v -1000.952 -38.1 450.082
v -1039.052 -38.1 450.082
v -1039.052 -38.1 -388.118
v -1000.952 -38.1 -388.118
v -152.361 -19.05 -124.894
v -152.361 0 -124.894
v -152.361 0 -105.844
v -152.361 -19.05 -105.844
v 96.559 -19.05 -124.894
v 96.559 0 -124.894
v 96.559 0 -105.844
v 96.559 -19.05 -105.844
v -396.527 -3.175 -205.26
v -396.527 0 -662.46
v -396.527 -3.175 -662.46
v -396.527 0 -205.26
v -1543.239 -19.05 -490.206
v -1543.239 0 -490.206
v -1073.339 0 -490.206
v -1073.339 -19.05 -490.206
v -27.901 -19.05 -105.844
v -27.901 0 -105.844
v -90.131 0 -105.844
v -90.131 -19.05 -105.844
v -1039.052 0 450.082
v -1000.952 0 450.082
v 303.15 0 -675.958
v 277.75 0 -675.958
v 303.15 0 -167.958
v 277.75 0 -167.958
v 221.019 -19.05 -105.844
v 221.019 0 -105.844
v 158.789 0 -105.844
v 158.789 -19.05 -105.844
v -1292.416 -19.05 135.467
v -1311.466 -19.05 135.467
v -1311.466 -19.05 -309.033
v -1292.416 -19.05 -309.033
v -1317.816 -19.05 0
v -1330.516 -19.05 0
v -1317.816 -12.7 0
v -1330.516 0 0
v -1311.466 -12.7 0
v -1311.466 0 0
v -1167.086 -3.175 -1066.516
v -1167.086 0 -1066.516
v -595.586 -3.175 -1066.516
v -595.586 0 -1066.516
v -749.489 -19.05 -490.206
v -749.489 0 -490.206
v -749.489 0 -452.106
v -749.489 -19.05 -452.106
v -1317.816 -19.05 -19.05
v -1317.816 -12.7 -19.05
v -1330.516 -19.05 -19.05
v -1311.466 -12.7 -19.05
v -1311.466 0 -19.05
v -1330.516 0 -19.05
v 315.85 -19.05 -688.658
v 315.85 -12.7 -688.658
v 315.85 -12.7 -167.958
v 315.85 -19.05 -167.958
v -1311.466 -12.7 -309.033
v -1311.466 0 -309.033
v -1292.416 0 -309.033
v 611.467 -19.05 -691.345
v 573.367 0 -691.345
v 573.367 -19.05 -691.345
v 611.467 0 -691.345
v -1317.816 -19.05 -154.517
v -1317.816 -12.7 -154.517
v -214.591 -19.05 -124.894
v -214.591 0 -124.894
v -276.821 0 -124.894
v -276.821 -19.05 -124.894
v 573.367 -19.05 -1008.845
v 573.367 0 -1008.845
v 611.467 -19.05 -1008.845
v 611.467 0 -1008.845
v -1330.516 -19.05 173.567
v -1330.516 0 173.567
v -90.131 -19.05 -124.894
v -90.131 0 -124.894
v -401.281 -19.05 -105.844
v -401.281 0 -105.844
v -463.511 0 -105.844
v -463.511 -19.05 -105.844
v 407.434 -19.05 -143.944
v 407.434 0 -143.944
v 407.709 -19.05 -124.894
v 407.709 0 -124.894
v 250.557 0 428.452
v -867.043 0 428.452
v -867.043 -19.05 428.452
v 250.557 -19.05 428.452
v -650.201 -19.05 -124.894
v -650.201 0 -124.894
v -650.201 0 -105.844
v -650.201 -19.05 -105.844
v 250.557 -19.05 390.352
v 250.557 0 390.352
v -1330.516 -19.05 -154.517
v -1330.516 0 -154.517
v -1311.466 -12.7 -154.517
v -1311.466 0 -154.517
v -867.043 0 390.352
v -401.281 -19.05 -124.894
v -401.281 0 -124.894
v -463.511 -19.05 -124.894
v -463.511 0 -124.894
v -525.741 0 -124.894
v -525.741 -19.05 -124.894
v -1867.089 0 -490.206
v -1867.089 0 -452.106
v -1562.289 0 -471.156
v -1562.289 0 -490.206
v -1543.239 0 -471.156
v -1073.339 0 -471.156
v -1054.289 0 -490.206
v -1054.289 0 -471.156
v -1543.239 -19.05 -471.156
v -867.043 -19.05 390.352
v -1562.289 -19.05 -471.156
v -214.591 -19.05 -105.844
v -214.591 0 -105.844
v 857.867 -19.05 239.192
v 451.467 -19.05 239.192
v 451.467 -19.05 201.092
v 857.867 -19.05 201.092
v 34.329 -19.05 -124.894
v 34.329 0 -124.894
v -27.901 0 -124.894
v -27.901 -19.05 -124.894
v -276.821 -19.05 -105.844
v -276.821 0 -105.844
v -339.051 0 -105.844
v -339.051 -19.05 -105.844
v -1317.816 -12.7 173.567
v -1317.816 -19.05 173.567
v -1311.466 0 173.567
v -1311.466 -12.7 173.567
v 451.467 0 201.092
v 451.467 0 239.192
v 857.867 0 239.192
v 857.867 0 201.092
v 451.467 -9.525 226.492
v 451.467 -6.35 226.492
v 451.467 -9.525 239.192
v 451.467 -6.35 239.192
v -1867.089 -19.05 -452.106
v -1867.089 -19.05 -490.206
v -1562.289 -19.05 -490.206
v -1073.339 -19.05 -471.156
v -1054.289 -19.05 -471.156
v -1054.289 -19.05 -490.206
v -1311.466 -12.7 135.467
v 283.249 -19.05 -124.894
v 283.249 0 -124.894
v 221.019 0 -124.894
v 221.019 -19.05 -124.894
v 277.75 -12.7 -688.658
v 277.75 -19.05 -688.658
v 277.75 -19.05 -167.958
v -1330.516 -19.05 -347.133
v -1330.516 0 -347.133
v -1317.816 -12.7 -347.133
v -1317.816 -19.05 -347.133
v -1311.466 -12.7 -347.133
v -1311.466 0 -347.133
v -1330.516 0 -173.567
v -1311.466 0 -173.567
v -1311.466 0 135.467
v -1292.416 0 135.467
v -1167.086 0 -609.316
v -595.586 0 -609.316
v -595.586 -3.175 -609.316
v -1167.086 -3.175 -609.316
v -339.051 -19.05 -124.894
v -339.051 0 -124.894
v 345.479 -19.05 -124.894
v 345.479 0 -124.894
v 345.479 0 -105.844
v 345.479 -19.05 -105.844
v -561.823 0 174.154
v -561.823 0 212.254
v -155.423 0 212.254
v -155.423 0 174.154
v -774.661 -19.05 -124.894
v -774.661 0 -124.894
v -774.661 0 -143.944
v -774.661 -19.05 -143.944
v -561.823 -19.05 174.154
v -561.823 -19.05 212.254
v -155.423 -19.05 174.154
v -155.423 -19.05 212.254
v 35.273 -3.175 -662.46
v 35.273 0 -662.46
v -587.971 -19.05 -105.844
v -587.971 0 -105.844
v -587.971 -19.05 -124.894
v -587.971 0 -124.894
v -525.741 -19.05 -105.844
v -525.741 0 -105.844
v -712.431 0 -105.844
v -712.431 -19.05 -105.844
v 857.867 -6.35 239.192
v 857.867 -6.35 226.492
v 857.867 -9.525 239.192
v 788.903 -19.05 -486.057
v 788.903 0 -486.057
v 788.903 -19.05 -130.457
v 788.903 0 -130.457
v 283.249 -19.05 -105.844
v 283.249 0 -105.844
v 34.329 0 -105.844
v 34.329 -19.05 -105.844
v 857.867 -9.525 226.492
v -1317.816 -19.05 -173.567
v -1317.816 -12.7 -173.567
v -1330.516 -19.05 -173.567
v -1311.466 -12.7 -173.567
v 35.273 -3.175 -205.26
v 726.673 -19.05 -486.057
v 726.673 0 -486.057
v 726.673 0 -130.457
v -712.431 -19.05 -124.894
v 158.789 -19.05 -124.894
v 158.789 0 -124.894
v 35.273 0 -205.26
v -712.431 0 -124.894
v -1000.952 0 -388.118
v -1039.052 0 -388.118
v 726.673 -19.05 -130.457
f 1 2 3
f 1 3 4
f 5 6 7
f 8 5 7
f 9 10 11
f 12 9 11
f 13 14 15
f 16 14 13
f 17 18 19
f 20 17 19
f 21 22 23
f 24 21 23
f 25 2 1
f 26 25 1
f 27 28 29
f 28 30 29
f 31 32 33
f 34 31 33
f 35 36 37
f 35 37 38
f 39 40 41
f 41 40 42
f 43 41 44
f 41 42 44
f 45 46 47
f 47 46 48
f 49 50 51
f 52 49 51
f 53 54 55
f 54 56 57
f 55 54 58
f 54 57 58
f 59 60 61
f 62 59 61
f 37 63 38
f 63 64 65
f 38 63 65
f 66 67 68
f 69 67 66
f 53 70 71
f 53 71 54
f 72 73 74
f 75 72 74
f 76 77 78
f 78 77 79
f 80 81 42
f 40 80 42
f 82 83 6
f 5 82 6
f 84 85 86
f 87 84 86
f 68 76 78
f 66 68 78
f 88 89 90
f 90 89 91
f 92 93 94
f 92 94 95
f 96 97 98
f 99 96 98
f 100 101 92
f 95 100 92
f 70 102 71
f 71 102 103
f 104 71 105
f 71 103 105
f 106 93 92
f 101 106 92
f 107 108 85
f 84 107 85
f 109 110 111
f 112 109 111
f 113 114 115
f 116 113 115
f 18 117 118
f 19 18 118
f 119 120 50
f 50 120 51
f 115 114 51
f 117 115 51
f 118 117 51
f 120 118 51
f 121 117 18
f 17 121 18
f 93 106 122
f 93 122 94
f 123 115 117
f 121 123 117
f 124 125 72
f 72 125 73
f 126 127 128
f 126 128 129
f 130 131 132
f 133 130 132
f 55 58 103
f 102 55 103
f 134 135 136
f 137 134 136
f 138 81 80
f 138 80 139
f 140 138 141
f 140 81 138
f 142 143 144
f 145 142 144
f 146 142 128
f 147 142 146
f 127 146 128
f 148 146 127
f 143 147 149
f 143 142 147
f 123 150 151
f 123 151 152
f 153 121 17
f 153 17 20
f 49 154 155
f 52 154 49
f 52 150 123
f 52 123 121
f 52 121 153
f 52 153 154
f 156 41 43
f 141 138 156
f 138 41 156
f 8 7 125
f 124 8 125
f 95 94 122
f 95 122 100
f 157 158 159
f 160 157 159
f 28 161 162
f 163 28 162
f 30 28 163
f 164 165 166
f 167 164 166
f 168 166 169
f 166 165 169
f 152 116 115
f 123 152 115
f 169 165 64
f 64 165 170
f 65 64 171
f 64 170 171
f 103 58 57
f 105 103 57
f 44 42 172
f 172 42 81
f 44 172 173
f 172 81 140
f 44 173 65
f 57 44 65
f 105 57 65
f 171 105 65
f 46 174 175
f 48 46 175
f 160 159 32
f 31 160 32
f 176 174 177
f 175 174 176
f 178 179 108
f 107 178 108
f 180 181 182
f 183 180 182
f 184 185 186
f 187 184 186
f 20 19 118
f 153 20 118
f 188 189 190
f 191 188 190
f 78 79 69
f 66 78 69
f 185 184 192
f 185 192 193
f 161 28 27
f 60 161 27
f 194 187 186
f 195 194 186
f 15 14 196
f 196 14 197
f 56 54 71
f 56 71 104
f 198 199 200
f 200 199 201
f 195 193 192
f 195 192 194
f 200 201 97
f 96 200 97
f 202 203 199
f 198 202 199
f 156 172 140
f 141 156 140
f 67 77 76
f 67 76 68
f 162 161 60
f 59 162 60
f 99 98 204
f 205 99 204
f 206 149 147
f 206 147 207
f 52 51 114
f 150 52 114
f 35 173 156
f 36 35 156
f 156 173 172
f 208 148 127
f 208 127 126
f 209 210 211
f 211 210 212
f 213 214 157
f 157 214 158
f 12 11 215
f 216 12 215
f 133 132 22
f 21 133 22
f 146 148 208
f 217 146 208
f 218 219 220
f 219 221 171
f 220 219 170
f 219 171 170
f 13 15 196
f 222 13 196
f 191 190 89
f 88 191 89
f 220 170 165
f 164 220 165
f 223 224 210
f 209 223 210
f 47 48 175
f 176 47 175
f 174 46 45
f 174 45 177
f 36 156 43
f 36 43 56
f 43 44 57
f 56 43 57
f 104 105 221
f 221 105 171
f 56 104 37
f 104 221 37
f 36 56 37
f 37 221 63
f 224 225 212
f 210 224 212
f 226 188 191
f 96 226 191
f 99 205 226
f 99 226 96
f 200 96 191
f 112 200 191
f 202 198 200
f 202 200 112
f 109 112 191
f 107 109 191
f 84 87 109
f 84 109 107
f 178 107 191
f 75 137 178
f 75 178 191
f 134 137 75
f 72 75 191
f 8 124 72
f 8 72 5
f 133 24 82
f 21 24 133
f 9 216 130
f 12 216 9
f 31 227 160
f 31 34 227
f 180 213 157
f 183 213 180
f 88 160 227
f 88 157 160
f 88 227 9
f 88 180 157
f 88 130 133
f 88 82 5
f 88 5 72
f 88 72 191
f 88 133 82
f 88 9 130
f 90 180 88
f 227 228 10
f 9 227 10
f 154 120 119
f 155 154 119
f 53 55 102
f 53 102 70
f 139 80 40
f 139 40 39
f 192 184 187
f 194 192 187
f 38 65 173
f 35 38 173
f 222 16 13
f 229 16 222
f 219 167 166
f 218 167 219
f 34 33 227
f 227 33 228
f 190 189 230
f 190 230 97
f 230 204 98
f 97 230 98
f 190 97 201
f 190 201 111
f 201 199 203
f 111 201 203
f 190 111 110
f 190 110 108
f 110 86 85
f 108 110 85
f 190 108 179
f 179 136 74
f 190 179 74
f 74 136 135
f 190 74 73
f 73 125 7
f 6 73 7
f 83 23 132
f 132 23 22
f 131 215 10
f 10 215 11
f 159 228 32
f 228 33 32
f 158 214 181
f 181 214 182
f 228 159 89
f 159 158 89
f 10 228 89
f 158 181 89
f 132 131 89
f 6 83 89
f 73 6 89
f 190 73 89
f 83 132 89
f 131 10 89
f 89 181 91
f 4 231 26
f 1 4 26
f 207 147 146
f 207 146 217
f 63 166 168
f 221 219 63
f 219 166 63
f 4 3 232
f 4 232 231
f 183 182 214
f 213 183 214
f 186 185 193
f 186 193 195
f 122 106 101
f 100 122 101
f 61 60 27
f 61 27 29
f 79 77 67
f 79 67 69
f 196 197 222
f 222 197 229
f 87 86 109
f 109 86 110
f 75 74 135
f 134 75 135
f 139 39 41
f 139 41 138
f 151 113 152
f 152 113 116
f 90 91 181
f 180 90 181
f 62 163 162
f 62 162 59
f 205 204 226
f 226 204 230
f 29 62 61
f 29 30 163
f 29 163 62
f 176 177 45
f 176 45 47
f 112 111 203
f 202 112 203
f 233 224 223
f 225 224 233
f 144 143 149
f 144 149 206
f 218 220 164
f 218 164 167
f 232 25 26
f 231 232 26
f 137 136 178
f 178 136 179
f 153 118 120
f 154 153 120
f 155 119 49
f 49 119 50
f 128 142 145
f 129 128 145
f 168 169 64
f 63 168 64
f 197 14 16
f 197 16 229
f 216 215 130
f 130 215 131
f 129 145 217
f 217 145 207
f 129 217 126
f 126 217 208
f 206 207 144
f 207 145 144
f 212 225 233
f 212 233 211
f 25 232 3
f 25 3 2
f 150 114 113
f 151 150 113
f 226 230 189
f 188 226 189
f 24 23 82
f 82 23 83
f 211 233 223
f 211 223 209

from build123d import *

# Parameters (mm, degrees)
F1_DEPTH  = 19.05
F2_W      = 38.1
F2_H      = 838.2
F3_DEPTH  = 38.1
F4_W      = 1117.6
F4_H      = 38.1
F5_DEPTH  = 19.05
F6_W      = 406.4
F6_H      = 38.1
F7_DEPTH  = 19.05
F8_W      = 62.23
F8_H      = 355.6
F9_DEPTH  = 19.05
F10_W     = 431.8
F10_H     = 457.2
F11_DEPTH = 3.175
F12_W     = 406.4
F12_H     = 3.175
F13_DEPTH = 12.7
F14_W     = 19.05
F14_H     = 38.1
F15_DEPTH = 19.05
F17_DEPTH = 19.05
F18_W     = 406.4
F18_H     = 38.1
F19_DEPTH = 19.05
F20_W     = 38.1
F20_H     = 520.7
F21_DEPTH = 19.05
F22_SIZE  = 12.7
F23_SIZE  = 12.7
F24_W     = 571.5
F24_H     = 457.2
F25_DEPTH = 3.175
F26_W     = 38.1
F26_H     = 317.5
F27_DEPTH = 19.05
F28_W     = 6.35
F28_H     = 520.7
F29_DEPTH = 6.35


with BuildPart() as f1:
    # F0 (on Front) → F1 (new body)
    with BuildSketch(Plane.XZ):
        Polygon((-650.200657, -105.844021), (-712.430657, -105.844021), (-712.430657, -124.894021), (-774.660657, -124.894021), (-774.660657, -143.944021), (407.433808, -143.944021), (407.709343, -124.894021), (345.479343, -124.894021), (345.479343, -105.844021), (283.249343, -105.844021), (283.249343, -124.894021), (221.019343, -124.894021), (221.019343, -105.844021), (158.789343, -105.844021), (158.789343, -124.894021), (96.559343, -124.894021), (96.559343, -105.844021), (34.329343, -105.844021), (34.329343, -124.894021), (-27.900657, -124.894021), (-27.900657, -105.844021), (-90.130657, -105.844021), (-90.130657, -124.894021), (-152.360657, -124.894021), (-152.360657, -105.844021), (-214.590657, -105.844021), (-214.590657, -124.894021), (-276.820657, -124.894021), (-276.820657, -105.844021), (-339.050657, -105.844021), (-339.050657, -124.894021), (-401.280657, -124.894021), (-401.280657, -105.844021), (-463.510657, -105.844021), (-463.510657, -124.894021), (-525.740657, -124.894021), (-525.740657, -105.844021), (-587.970657, -105.844021), (-587.970657, -124.894021), (-650.200657, -124.894021), align=None)
    extrude(amount=F1_DEPTH)


with BuildPart() as f3:
    # F2 (on Front) → F3 (new body)
    with BuildSketch(Plane.XZ):
        with Locations((-1020.001639, 30.982481)):
            Rectangle(F2_W, F2_H)
    extrude(amount=F3_DEPTH)


with BuildPart() as f5:
    # F4 (on Front) → F5 (new body)
    with BuildSketch(Plane.XZ):
        with Locations((-308.242815, 409.40186)):
            Rectangle(F4_W, F4_H)
    extrude(amount=F5_DEPTH)


with BuildPart() as f7:
    # F6 (on Front) → F7 (new body)
    with BuildSketch(Plane.XZ):
        with Locations((654.666776, 220.141749)):
            Rectangle(F6_W, F6_H)
    extrude(amount=F7_DEPTH)

    # F12 (on face) → F13 (cut)
    with BuildSketch(Plane.XY.offset(239.191749)):
        with Locations((654.666776, -7.9375)):
            Rectangle(F12_W, F12_H)
    extrude(amount=-F13_DEPTH, mode=Mode.SUBTRACT)


with BuildPart() as f9:
    # F8 (on Front) → F9 (new body)
    with BuildSketch(Plane.XZ):
        with Locations((757.788079, -308.256779)):
            Rectangle(F8_W, F8_H)
    extrude(amount=F9_DEPTH)


with BuildPart() as f11:
    # F10 (on Front) → F11 (new body)
    with BuildSketch(Plane.XZ):
        with Locations((-180.627198, -433.859834)):
            Rectangle(F10_W, F10_H)
    extrude(amount=F11_DEPTH)


with BuildPart() as f15:
    # F14 (on Front) → F15 (new body)
    with BuildSketch(Plane.XZ):
        with Locations((-1320.991134, 154.516667)):
            Rectangle(F14_W, F14_H)
        Polygon((-1311.466134, 135.466667), (-1330.516134, 135.466667), (-1330.516134, 0), (-1311.466134, 0), (-1311.466134, -19.05), (-1330.516134, -19.05), (-1330.516134, -154.516667), (-1311.466134, -154.516667), (-1311.466134, -173.566667), (-1330.516134, -173.566667), (-1330.516134, -309.033333), (-1311.466134, -309.033333), (-1292.416134, -309.033333), (-1292.416134, 135.466667), align=None)
        with Locations((-1320.991134, -328.083333)):
            Rectangle(F14_W, F14_H)
    extrude(amount=F15_DEPTH)

    # F28 (on face) → F29 (cut)
    with BuildSketch(Plane.XZ.offset(19.05)):
        with Locations((-1314.641134, -86.783333)):
            Rectangle(F28_W, F28_H)
    extrude(amount=-F29_DEPTH, mode=Mode.SUBTRACT)


with BuildPart() as f17:
    # F16 (on Front) → F17 (new body)
    with BuildSketch(Plane.XZ):
        Polygon((-749.489152, -452.106331), (-1867.089152, -452.106331), (-1867.089152, -490.206331), (-1562.289152, -490.206331), (-1562.289152, -471.156331), (-1543.239152, -471.156331), (-1543.239152, -490.206331), (-1073.339152, -490.206331), (-1073.339152, -471.156331), (-1054.289152, -471.156331), (-1054.289152, -490.206331), (-749.489152, -490.206331), align=None)
    extrude(amount=F17_DEPTH)


with BuildPart() as f19:
    # F18 (on Front) → F19 (new body)
    with BuildSketch(Plane.XZ):
        with Locations((-358.623012, 193.204112)):
            Rectangle(F18_W, F18_H)
    extrude(amount=F19_DEPTH)


with BuildPart() as f21:
    # F20 (on Front) → F21 (new body)
    with BuildSketch(Plane.XZ):
        with Locations((296.800062, -428.307901)):
            Rectangle(F20_W, F20_H)
    extrude(amount=F21_DEPTH)

    # F22
    f22_edges = [f21.edges().sort_by_distance(p)[0] for p in [
        (296.800062, 0, -688.657901),
    ]]
    chamfer(f22_edges, length=F22_SIZE)

    # F23
    f23_edges = [f21.edges().sort_by_distance(p)[0] for p in [
        (315.850062, 0, -421.957901),
    ]]
    chamfer(f23_edges, length=F23_SIZE)


with BuildPart() as f25:
    # F24 (on Front) → F25 (new body)
    with BuildSketch(Plane.XZ):
        with Locations((-881.336419, -837.915634)):
            Rectangle(F24_W, F24_H)
    extrude(amount=F25_DEPTH)


with BuildPart() as f27:
    # F26 (on Front) → F27 (new body)
    with BuildSketch(Plane.XZ):
        with Locations((592.417151, -850.094514)):
            Rectangle(F26_W, F26_H)
    extrude(amount=F27_DEPTH)


solid = Compound([f1.part, f3.part, f5.part, f7.part, f9.part, f11.part, f15.part, f17.part, f19.part, f21.part, f25.part, f27.part])
